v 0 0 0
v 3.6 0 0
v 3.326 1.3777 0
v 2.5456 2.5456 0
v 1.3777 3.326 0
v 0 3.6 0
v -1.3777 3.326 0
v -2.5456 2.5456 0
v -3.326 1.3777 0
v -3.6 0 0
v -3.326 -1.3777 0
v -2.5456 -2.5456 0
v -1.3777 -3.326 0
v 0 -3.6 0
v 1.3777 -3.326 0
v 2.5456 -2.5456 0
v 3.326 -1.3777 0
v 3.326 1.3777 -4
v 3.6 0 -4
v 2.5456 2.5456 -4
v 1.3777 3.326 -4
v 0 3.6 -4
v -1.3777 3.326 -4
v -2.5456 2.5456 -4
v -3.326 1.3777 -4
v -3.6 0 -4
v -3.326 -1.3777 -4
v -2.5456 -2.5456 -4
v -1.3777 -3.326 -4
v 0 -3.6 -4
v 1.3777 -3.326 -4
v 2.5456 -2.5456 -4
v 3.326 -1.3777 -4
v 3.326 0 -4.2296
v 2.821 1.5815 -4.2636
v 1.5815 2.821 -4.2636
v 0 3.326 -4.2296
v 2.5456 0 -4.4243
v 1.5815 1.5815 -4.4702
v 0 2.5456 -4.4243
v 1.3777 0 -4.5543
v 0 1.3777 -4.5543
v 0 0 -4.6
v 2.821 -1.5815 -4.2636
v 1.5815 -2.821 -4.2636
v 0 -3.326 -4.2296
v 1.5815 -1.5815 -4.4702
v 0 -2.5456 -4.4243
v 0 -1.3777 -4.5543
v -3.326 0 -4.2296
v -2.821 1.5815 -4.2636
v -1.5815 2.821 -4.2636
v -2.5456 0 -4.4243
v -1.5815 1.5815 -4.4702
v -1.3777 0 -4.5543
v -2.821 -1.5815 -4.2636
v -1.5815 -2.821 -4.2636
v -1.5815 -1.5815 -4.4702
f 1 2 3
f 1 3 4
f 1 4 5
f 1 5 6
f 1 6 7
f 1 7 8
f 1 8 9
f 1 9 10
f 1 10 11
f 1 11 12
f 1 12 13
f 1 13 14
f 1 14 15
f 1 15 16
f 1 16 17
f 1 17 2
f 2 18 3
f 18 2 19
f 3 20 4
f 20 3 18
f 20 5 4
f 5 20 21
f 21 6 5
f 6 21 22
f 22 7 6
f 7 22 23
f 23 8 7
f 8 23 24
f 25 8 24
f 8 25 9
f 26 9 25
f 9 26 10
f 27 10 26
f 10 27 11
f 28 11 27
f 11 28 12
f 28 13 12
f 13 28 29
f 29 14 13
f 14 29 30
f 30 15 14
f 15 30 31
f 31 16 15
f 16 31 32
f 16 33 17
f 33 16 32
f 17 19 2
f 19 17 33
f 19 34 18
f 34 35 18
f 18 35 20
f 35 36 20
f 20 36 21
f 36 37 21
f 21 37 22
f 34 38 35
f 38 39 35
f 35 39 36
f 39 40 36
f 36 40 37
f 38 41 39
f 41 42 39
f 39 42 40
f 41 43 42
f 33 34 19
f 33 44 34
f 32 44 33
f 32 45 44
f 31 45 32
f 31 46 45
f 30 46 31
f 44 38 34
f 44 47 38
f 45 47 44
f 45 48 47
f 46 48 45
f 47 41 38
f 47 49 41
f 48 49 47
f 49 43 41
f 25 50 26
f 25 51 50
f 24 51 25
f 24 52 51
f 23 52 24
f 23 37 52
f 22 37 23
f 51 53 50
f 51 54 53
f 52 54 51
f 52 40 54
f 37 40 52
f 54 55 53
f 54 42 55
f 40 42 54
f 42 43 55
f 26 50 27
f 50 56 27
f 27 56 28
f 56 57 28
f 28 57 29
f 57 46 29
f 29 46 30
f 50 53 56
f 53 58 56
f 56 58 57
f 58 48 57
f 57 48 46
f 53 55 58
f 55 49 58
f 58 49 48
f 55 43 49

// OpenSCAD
// file: ../p/1-8sphe.scad
use <../lib.scad>
function ldraw_lib__1_8sphe() = [
// 0 Sphere 0.125
// 0 Name: 1-8sphe.dat
// 0 Author: James Jessiman
// 0 !LDRAW_ORG Primitive UPDATE 2012-03
// 0 !LICENSE Licensed under CC BY 4.0 : see CAreadme.txt
// 
// 0 BFC CERTIFY CCW
  [0,"BFC","CERTIFY"],
  [0,"BFC","CCW"],
// 
// 0 !HISTORY 2000-08-01 {Axel Poque} fixes to resolve L3P error messages.
// 0 !HISTORY 2000-08-01 {Manfred Moolhuysen} fixes to resolve L3P error messages.
// 0 !HISTORY 2000-09-30 [PTadmin] Official Update 2000-02
// 0 !HISTORY 2002-03-28 [hafhead] Made BFC compliant
// 0 !HISTORY 2002-04-25 [PTadmin] Official Update 2002-02
// 0 !HISTORY 2007-06-22 [PTadmin] Header formatted for Contributor Agreement
// 0 !HISTORY 2008-07-01 [PTadmin] Official Update 2008-01
// 0 !HISTORY 2010-09-12 [MagFors] Changed winding, removed duplicated cond-line, optimized filesize
// 0 !HISTORY 2010-12-31 [PTadmin] Official Update 2010-03
// 0 !HISTORY 2012-07-01 [tcobbs] Replaced with geometry from LDView
// 0 !HISTORY 2012-12-28 [PTadmin] Official Update 2012-03
// 
// 
// 3 16 1 0 0 0.9239 0.3827 0 0.9239 0 0.3827
  [3,16,1,0,0,0.9239,0.3827,0,0.9239,0,0.3827],
// 3 16 0.9239 0.3827 0 0.7836 0.4393 0.4393 0.9239 0 0.3827
  [3,16,0.9239,0.3827,0,0.7836,0.4393,0.4393,0.9239,0,0.3827],
// 3 16 0.9239 0 0.3827 0.7836 0.4393 0.4393 0.7071 0 0.7071
  [3,16,0.9239,0,0.3827,0.7836,0.4393,0.4393,0.7071,0,0.7071],
// 3 16 0.7836 0.4393 0.4393 0.4393 0.4393 0.7836 0.7071 0 0.7071
  [3,16,0.7836,0.4393,0.4393,0.4393,0.4393,0.7836,0.7071,0,0.7071],
// 3 16 0.7071 0 0.7071 0.4393 0.4393 0.7836 0.3827 0 0.9239
  [3,16,0.7071,0,0.7071,0.4393,0.4393,0.7836,0.3827,0,0.9239],
// 3 16 0.4393 0.4393 0.7836 0 0.3827 0.9239 0.3827 0 0.9239
  [3,16,0.4393,0.4393,0.7836,0,0.3827,0.9239,0.3827,0,0.9239],
// 3 16 0.3827 0 0.9239 0 0.3827 0.9239 0 0 1
  [3,16,0.3827,0,0.9239,0,0.3827,0.9239,0,0,1],
// 3 16 0.9239 0.3827 0 0.7071 0.7071 0 0.7836 0.4393 0.4393
  [3,16,0.9239,0.3827,0,0.7071,0.7071,0,0.7836,0.4393,0.4393],
// 3 16 0.7071 0.7071 0 0.4393 0.7836 0.4393 0.7836 0.4393 0.4393
  [3,16,0.7071,0.7071,0,0.4393,0.7836,0.4393,0.7836,0.4393,0.4393],
// 3 16 0.7836 0.4393 0.4393 0.4393 0.7836 0.4393 0.4393 0.4393 0.7836
  [3,16,0.7836,0.4393,0.4393,0.4393,0.7836,0.4393,0.4393,0.4393,0.7836],
// 3 16 0.4393 0.7836 0.4393 0 0.7071 0.7071 0.4393 0.4393 0.7836
  [3,16,0.4393,0.7836,0.4393,0,0.7071,0.7071,0.4393,0.4393,0.7836],
// 3 16 0.4393 0.4393 0.7836 0 0.7071 0.7071 0 0.3827 0.9239
  [3,16,0.4393,0.4393,0.7836,0,0.7071,0.7071,0,0.3827,0.9239],
// 3 16 0.7071 0.7071 0 0.3827 0.9239 0 0.4393 0.7836 0.4393
  [3,16,0.7071,0.7071,0,0.3827,0.9239,0,0.4393,0.7836,0.4393],
// 3 16 0.3827 0.9239 0 0 0.9239 0.3827 0.4393 0.7836 0.4393
  [3,16,0.3827,0.9239,0,0,0.9239,0.3827,0.4393,0.7836,0.4393],
// 3 16 0.4393 0.7836 0.4393 0 0.9239 0.3827 0 0.7071 0.7071
  [3,16,0.4393,0.7836,0.4393,0,0.9239,0.3827,0,0.7071,0.7071],
// 3 16 0.3827 0.9239 0 0 1 0 0 0.9239 0.3827
  [3,16,0.3827,0.9239,0,0,1,0,0,0.9239,0.3827],
// 
// 5 24 1 0 0 0.9239 0.3827 0 1 0 -0.1 0.9239 0 0.3827
  [5,24,1,0,0,0.9239,0.3827,0,1,0,-0.1,0.9239,0,0.3827],
// 5 24 0.9239 0.3827 0 0.9239 0 0.3827 1 0 0 0.7836 0.4393 0.4393
  [5,24,0.9239,0.3827,0,0.9239,0,0.3827,1,0,0,0.7836,0.4393,0.4393],
// 5 24 1 0 0 0.9239 0 0.3827 0.9239 0.3827 0 1 -0.1 0
  [5,24,1,0,0,0.9239,0,0.3827,0.9239,0.3827,0,1,-0.1,0],
// 5 24 0.9239 0 0.3827 0.7836 0.4393 0.4393 0.9239 0.3827 0 0.7071 0 0.7071
  [5,24,0.9239,0,0.3827,0.7836,0.4393,0.4393,0.9239,0.3827,0,0.7071,0,0.7071],
// 5 24 0.7836 0.4393 0.4393 0.7071 0 0.7071 0.9239 0 0.3827 0.4393 0.4393 0.7836
  [5,24,0.7836,0.4393,0.4393,0.7071,0,0.7071,0.9239,0,0.3827,0.4393,0.4393,0.7836],
// 5 24 0.9239 0 0.3827 0.7071 0 0.7071 0.7836 0.4393 0.4393 0.9239 -0.1 0.3827
  [5,24,0.9239,0,0.3827,0.7071,0,0.7071,0.7836,0.4393,0.4393,0.9239,-0.1,0.3827],
// 5 24 0.7071 0 0.7071 0.4393 0.4393 0.7836 0.7836 0.4393 0.4393 0.3827 0 0.9239
  [5,24,0.7071,0,0.7071,0.4393,0.4393,0.7836,0.7836,0.4393,0.4393,0.3827,0,0.9239],
// 5 24 0.4393 0.4393 0.7836 0.3827 0 0.9239 0.7071 0 0.7071 0 0.3827 0.9239
  [5,24,0.4393,0.4393,0.7836,0.3827,0,0.9239,0.7071,0,0.7071,0,0.3827,0.9239],
// 5 24 0.7071 0 0.7071 0.3827 0 0.9239 0.4393 0.4393 0.7836 0.7071 -0.1 0.7071
  [5,24,0.7071,0,0.7071,0.3827,0,0.9239,0.4393,0.4393,0.7836,0.7071,-0.1,0.7071],
// 5 24 0.3827 0 0.9239 0 0.3827 0.9239 0.4393 0.4393 0.7836 0 0 1
  [5,24,0.3827,0,0.9239,0,0.3827,0.9239,0.4393,0.4393,0.7836,0,0,1],
// 5 24 0 0.3827 0.9239 0 0 1 0.3827 0 0.9239 -0.1 0.3827 0.9239
  [5,24,0,0.3827,0.9239,0,0,1,0.3827,0,0.9239,-0.1,0.3827,0.9239],
// 5 24 0.3827 0 0.9239 0 0 1 0 0.3827 0.9239 0.3827 -0.1 0.9239
  [5,24,0.3827,0,0.9239,0,0,1,0,0.3827,0.9239,0.3827,-0.1,0.9239],
// 5 24 0.9239 0.3827 0 0.7071 0.7071 0 0.9239 0.3827 -0.1 0.7836 0.4393 0.4393
  [5,24,0.9239,0.3827,0,0.7071,0.7071,0,0.9239,0.3827,-0.1,0.7836,0.4393,0.4393],
// 5 24 0.7071 0.7071 0 0.7836 0.4393 0.4393 0.9239 0.3827 0 0.4393 0.7836 0.4393
  [5,24,0.7071,0.7071,0,0.7836,0.4393,0.4393,0.9239,0.3827,0,0.4393,0.7836,0.4393],
// 5 24 0.9239 0.3827 0 0.7836 0.4393 0.4393 0.7071 0.7071 0 0.9239 0 0.3827
  [5,24,0.9239,0.3827,0,0.7836,0.4393,0.4393,0.7071,0.7071,0,0.9239,0,0.3827],
// 5 24 0.7836 0.4393 0.4393 0.4393 0.7836 0.4393 0.7071 0.7071 0 0.4393 0.4393 0.7836
  [5,24,0.7836,0.4393,0.4393,0.4393,0.7836,0.4393,0.7071,0.7071,0,0.4393,0.4393,0.7836],
// 5 24 0.4393 0.7836 0.4393 0.4393 0.4393 0.7836 0.7836 0.4393 0.4393 0 0.7071 0.7071
  [5,24,0.4393,0.7836,0.4393,0.4393,0.4393,0.7836,0.7836,0.4393,0.4393,0,0.7071,0.7071],
// 5 24 0.7836 0.4393 0.4393 0.4393 0.4393 0.7836 0.4393 0.7836 0.4393 0.7071 0 0.7071
  [5,24,0.7836,0.4393,0.4393,0.4393,0.4393,0.7836,0.4393,0.7836,0.4393,0.7071,0,0.7071],
// 5 24 0.4393 0.4393 0.7836 0 0.7071 0.7071 0.4393 0.7836 0.4393 0 0.3827 0.9239
  [5,24,0.4393,0.4393,0.7836,0,0.7071,0.7071,0.4393,0.7836,0.4393,0,0.3827,0.9239],
// 5 24 0 0.7071 0.7071 0 0.3827 0.9239 0.4393 0.4393 0.7836 -0.1 0.7071 0.7071
  [5,24,0,0.7071,0.7071,0,0.3827,0.9239,0.4393,0.4393,0.7836,-0.1,0.7071,0.7071],
// 5 24 0.4393 0.4393 0.7836 0 0.3827 0.9239 0 0.7071 0.7071 0.3827 0 0.9239
  [5,24,0.4393,0.4393,0.7836,0,0.3827,0.9239,0,0.7071,0.7071,0.3827,0,0.9239],
// 5 24 0.7071 0.7071 0 0.3827 0.9239 0 0.7071 0.7071 -0.1 0.4393 0.7836 0.4393
  [5,24,0.7071,0.7071,0,0.3827,0.9239,0,0.7071,0.7071,-0.1,0.4393,0.7836,0.4393],
// 5 24 0.3827 0.9239 0 0.4393 0.7836 0.4393 0.7071 0.7071 0 0 0.9239 0.3827
  [5,24,0.3827,0.9239,0,0.4393,0.7836,0.4393,0.7071,0.7071,0,0,0.9239,0.3827],
// 5 24 0.7071 0.7071 0 0.4393 0.7836 0.4393 0.3827 0.9239 0 0.7836 0.4393 0.4393
  [5,24,0.7071,0.7071,0,0.4393,0.7836,0.4393,0.3827,0.9239,0,0.7836,0.4393,0.4393],
// 5 24 0.4393 0.7836 0.4393 0 0.9239 0.3827 0.3827 0.9239 0 0 0.7071 0.7071
  [5,24,0.4393,0.7836,0.4393,0,0.9239,0.3827,0.3827,0.9239,0,0,0.7071,0.7071],
// 5 24 0 0.9239 0.3827 0 0.7071 0.7071 0.4393 0.7836 0.4393 -0.1 0.9239 0.3827
  [5,24,0,0.9239,0.3827,0,0.7071,0.7071,0.4393,0.7836,0.4393,-0.1,0.9239,0.3827],
// 5 24 0.4393 0.7836 0.4393 0 0.7071 0.7071 0 0.9239 0.3827 0.4393 0.4393 0.7836
  [5,24,0.4393,0.7836,0.4393,0,0.7071,0.7071,0,0.9239,0.3827,0.4393,0.4393,0.7836],
// 5 24 0.3827 0.9239 0 0 1 0 0.3827 0.9239 -0.1 0 0.9239 0.3827
  [5,24,0.3827,0.9239,0,0,1,0,0.3827,0.9239,-0.1,0,0.9239,0.3827],
// 5 24 0 1 0 0 0.9239 0.3827 0.3827 0.9239 0 -0.1 1 0
  [5,24,0,1,0,0,0.9239,0.3827,0.3827,0.9239,0,-0.1,1,0],
// 5 24 0.3827 0.9239 0 0 0.9239 0.3827 0 1 0 0.4393 0.7836 0.4393
  [5,24,0.3827,0.9239,0,0,0.9239,0.3827,0,1,0,0.4393,0.7836,0.4393],
];
module ldraw_lib__1_8sphe(step=0, col=false, unit=2/5, alt=false, line=0.2, solid=!$preview)
    makepoly(ldraw_lib__1_8sphe(), step=step, col=col, unit=unit, alt=alt, line=line, solid=solid);
ldraw_lib__1_8sphe(line=0.2);
// file: ../p/4-8sphe.scad
use <../lib.scad>
use <1-8sphe.scad>
function ldraw_lib__4_8sphe() = [
// 0 Sphere 0.5
// 0 Name: 4-8sphe.dat
// 0 Author: James Jessiman
// 0 !LDRAW_ORG Primitive UPDATE 2003-02
// 0 !LICENSE Licensed under CC BY 4.0 : see CAreadme.txt
// 
// 0 BFC CERTIFY CCW
  [0,"BFC","CERTIFY"],
  [0,"BFC","CCW"],
// 
// 0 !HISTORY 2002-08-31 [izanette] Modified with WINDZ for BFC compliance
// 0 !HISTORY 2003-08-01 [PTadmin] Official Update 2003-02
// 0 !HISTORY 2007-06-24 [PTadmin] Header formatted for Contributor Agreement
// 0 !HISTORY 2008-07-01 [PTadmin] Official Update 2008-01
// 
// 
// 1 16 0 0 0 1 0 0 0 1 0 0 0 1 1-8sphe.dat
  [1,16,0,0,0,1,0,0,0,1,0,0,0,1, ldraw_lib__1_8sphe()],
// 1 16 0 0 0 1 0 0 0 1 0 0 0 -1 1-8sphe.dat
  [1,16,0,0,0,1,0,0,0,1,0,0,0,-1, ldraw_lib__1_8sphe()],
// 1 16 0 0 0 -1 0 0 0 1 0 0 0 1 1-8sphe.dat
  [1,16,0,0,0,-1,0,0,0,1,0,0,0,1, ldraw_lib__1_8sphe()],
// 1 16 0 0 0 -1 0 0 0 1 0 0 0 -1 1-8sphe.dat
  [1,16,0,0,0,-1,0,0,0,1,0,0,0,-1, ldraw_lib__1_8sphe()],
// 0
// 
];
module ldraw_lib__4_8sphe(step=0, col=false, unit=2/5, alt=false, line=0.2, solid=!$preview)
    makepoly(ldraw_lib__4_8sphe(), step=step, col=col, unit=unit, alt=alt, line=line, solid=solid);
ldraw_lib__4_8sphe(line=0.2);
// file: ../p/4-4edge.scad
use <../lib.scad>
function ldraw_lib__4_4edge() = [
// 0 Circle 1.0
// 0 Name: 4-4edge.dat
// 0 Author: James Jessiman
// 0 !LDRAW_ORG Primitive UPDATE 2017-01
// 0 !LICENSE Licensed under CC BY 4.0 : see CAreadme.txt
// 
// 0 BFC CERTIFY CCW
  [0,"BFC","CERTIFY"],
  [0,"BFC","CCW"],
// 
// 0 !HISTORY 1998-12-15 [PTadmin] Official Update 1998-10
// 0 !HISTORY 2005-12-28 [PTadmin] Official Update 2005-01
// 0 !HISTORY 2007-06-24 [PTadmin] Header formatted for Contributor Agreement
// 0 !HISTORY 2008-07-01 [PTadmin] Official Update 2008-01
// 0 !HISTORY 2017-01-15 [Steffen] BFCed
// 0 !HISTORY 2017-12-30 [PTadmin] Official Update 2017-01
// 
// 
// 2 24 1 0 0 0.9239 0 0.3827
  [2,24,1,0,0,0.9239,0,0.3827],
// 2 24 0.9239 0 0.3827 0.7071 0 0.7071
  [2,24,0.9239,0,0.3827,0.7071,0,0.7071],
// 2 24 0.7071 0 0.7071 0.3827 0 0.9239
  [2,24,0.7071,0,0.7071,0.3827,0,0.9239],
// 2 24 0.3827 0 0.9239 0 0 1
  [2,24,0.3827,0,0.9239,0,0,1],
// 2 24 0 0 1 -0.3827 0 0.9239
  [2,24,0,0,1,-0.3827,0,0.9239],
// 2 24 -0.3827 0 0.9239 -0.7071 0 0.7071
  [2,24,-0.3827,0,0.9239,-0.7071,0,0.7071],
// 2 24 -0.7071 0 0.7071 -0.9239 0 0.3827
  [2,24,-0.7071,0,0.7071,-0.9239,0,0.3827],
// 2 24 -0.9239 0 0.3827 -1 0 -0
  [2,24,-0.9239,0,0.3827,-1,0,-0],
// 2 24 -1 0 -0 -0.9239 0 -0.3827
  [2,24,-1,0,-0,-0.9239,0,-0.3827],
// 2 24 -0.9239 0 -0.3827 -0.7071 0 -0.7071
  [2,24,-0.9239,0,-0.3827,-0.7071,0,-0.7071],
// 2 24 -0.7071 0 -0.7071 -0.3827 0 -0.9239
  [2,24,-0.7071,0,-0.7071,-0.3827,0,-0.9239],
// 2 24 -0.3827 0 -0.9239 0 0 -1
  [2,24,-0.3827,0,-0.9239,0,0,-1],
// 2 24 0 0 -1 0.3827 0 -0.9239
  [2,24,0,0,-1,0.3827,0,-0.9239],
// 2 24 0.3827 0 -0.9239 0.7071 0 -0.7071
  [2,24,0.3827,0,-0.9239,0.7071,0,-0.7071],
// 2 24 0.7071 0 -0.7071 0.9239 0 -0.3827
  [2,24,0.7071,0,-0.7071,0.9239,0,-0.3827],
// 2 24 0.9239 0 -0.3827 1 0 0
  [2,24,0.9239,0,-0.3827,1,0,0],
];
module ldraw_lib__4_4edge(step=0, col=false, unit=2/5, alt=false, line=0.2, solid=!$preview)
    makepoly(ldraw_lib__4_4edge(), step=step, col=col, unit=unit, alt=alt, line=line, solid=solid);
ldraw_lib__4_4edge(line=0.2);
// file: ../p/4-4disc.scad
use <../lib.scad>
function ldraw_lib__4_4disc() = [
// 0 Disc 1.0
// 0 Name: 4-4disc.dat
// 0 Author: James Jessiman
// 0 !LDRAW_ORG Primitive UPDATE 2002-02
// 0 !LICENSE Licensed under CC BY 4.0 : see CAreadme.txt
// 
// 0 BFC CERTIFY CCW
  [0,"BFC","CERTIFY"],
  [0,"BFC","CCW"],
// 
// 0 !HISTORY 1998-12-15 [PTadmin] Official Update 1998-10
// 0 !HISTORY 2002-03-23 [sbliss] Added BFC statement
// 0 !HISTORY 2002-04-25 [PTadmin] Official Update 2002-02
// 0 !HISTORY 2007-06-24 [PTadmin] Header formatted for Contributor Agreement
// 0 !HISTORY 2008-07-01 [PTadmin] Official Update 2008-01
// 
// 
// 3 16 0 0 0 1 0 0 0.9239 0 0.3827
  [3,16,0,0,0,1,0,0,0.9239,0,0.3827],
// 3 16 0 0 0 0.9239 0 0.3827 0.7071 0 0.7071
  [3,16,0,0,0,0.9239,0,0.3827,0.7071,0,0.7071],
// 3 16 0 0 0 0.7071 0 0.7071 0.3827 0 0.9239
  [3,16,0,0,0,0.7071,0,0.7071,0.3827,0,0.9239],
// 3 16 0 0 0 0.3827 0 0.9239 0 0 1
  [3,16,0,0,0,0.3827,0,0.9239,0,0,1],
// 3 16 0 0 0 0 0 1 -0.3827 0 0.9239
  [3,16,0,0,0,0,0,1,-0.3827,0,0.9239],
// 3 16 0 0 0 -0.3827 0 0.9239 -0.7071 0 0.7071
  [3,16,0,0,0,-0.3827,0,0.9239,-0.7071,0,0.7071],
// 3 16 0 0 0 -0.7071 0 0.7071 -0.9239 0 0.3827
  [3,16,0,0,0,-0.7071,0,0.7071,-0.9239,0,0.3827],
// 3 16 0 0 0 -0.9239 0 0.3827 -1 0 -0
  [3,16,0,0,0,-0.9239,0,0.3827,-1,0,-0],
// 3 16 0 0 0 -1 0 -0 -0.9239 0 -0.3827
  [3,16,0,0,0,-1,0,-0,-0.9239,0,-0.3827],
// 3 16 0 0 0 -0.9239 0 -0.3827 -0.7071 0 -0.7071
  [3,16,0,0,0,-0.9239,0,-0.3827,-0.7071,0,-0.7071],
// 3 16 0 0 0 -0.7071 0 -0.7071 -0.3827 0 -0.9239
  [3,16,0,0,0,-0.7071,0,-0.7071,-0.3827,0,-0.9239],
// 3 16 0 0 0 -0.3827 0 -0.9239 0 0 -1
  [3,16,0,0,0,-0.3827,0,-0.9239,0,0,-1],
// 3 16 0 0 0 0 0 -1 0.3827 0 -0.9239
  [3,16,0,0,0,0,0,-1,0.3827,0,-0.9239],
// 3 16 0 0 0 0.3827 0 -0.9239 0.7071 0 -0.7071
  [3,16,0,0,0,0.3827,0,-0.9239,0.7071,0,-0.7071],
// 3 16 0 0 0 0.7071 0 -0.7071 0.9239 0 -0.3827
  [3,16,0,0,0,0.7071,0,-0.7071,0.9239,0,-0.3827],
// 3 16 0 0 0 0.9239 0 -0.3827 1 0 0
  [3,16,0,0,0,0.9239,0,-0.3827,1,0,0],
// 0
];
module ldraw_lib__4_4disc(step=0, col=false, unit=2/5, alt=false, line=0.2, solid=!$preview)
    makepoly(ldraw_lib__4_4disc(), step=step, col=col, unit=unit, alt=alt, line=line, solid=solid);
ldraw_lib__4_4disc(line=0.2);
// file: ../p/4-4cyli.scad
use <../lib.scad>
function ldraw_lib__4_4cyli() = [
// 0 Cylinder 1.0
// 0 Name: 4-4cyli.dat
// 0 Author: James Jessiman
// 0 !LDRAW_ORG Primitive UPDATE 2005-01
// 0 !LICENSE Licensed under CC BY 4.0 : see CAreadme.txt
// 
// 0 BFC CERTIFY CCW
  [0,"BFC","CERTIFY"],
  [0,"BFC","CCW"],
// 
// 0 !HISTORY 1998-12-15 [PTadmin] Official Update 1998-10
// 0 !HISTORY 2002-03-23 [sbliss] Added BFC statement; merged headers from files in distributions LDraw 0.27 and Complete.
// 0 !HISTORY 2002-04-25 [PTadmin] Official Update 2002-02
// 0 !HISTORY 2004-12-14 [guyvivan] BFC CCW
// 0 !HISTORY 2005-12-28 [PTadmin] Official Update 2005-01
// 0 !HISTORY 2007-06-24 [PTadmin] Header formatted for Contributor Agreement
// 0 !HISTORY 2008-07-01 [PTadmin] Official Update 2008-01
// 
// 
// 4 16 1 1 0 0.9239 1 0.3827 0.9239 0 0.3827 1 0 0
  [4,16,1,1,0,0.9239,1,0.3827,0.9239,0,0.3827,1,0,0],
// 5 24 1 0 0 1 1 0 0.9239 0 0.3827 0.9239 0 -0.3827
  [5,24,1,0,0,1,1,0,0.9239,0,0.3827,0.9239,0,-0.3827],
// 4 16 0.9239 1 0.3827 0.7071 1 0.7071 0.7071 0 0.7071 0.9239 0 0.3827
  [4,16,0.9239,1,0.3827,0.7071,1,0.7071,0.7071,0,0.7071,0.9239,0,0.3827],
// 5 24 0.9239 0 0.3827 0.9239 1 0.3827 0.7071 0 0.7071 1 0 0
  [5,24,0.9239,0,0.3827,0.9239,1,0.3827,0.7071,0,0.7071,1,0,0],
// 4 16 0.7071 1 0.7071 0.3827 1 0.9239 0.3827 0 0.9239 0.7071 0 0.7071
  [4,16,0.7071,1,0.7071,0.3827,1,0.9239,0.3827,0,0.9239,0.7071,0,0.7071],
// 5 24 0.7071 0 0.7071 0.7071 1 0.7071 0.3827 0 0.9239 0.9239 0 0.3827
  [5,24,0.7071,0,0.7071,0.7071,1,0.7071,0.3827,0,0.9239,0.9239,0,0.3827],
// 4 16 0.3827 1 0.9239 0 1 1 0 0 1 0.3827 0 0.9239
  [4,16,0.3827,1,0.9239,0,1,1,0,0,1,0.3827,0,0.9239],
// 5 24 0.3827 0 0.9239 0.3827 1 0.9239 0 0 1 0.7071 0 0.7071
  [5,24,0.3827,0,0.9239,0.3827,1,0.9239,0,0,1,0.7071,0,0.7071],
// 4 16 0 1 1 -0.3827 1 0.9239 -0.3827 0 0.9239 0 0 1
  [4,16,0,1,1,-0.3827,1,0.9239,-0.3827,0,0.9239,0,0,1],
// 5 24 0 0 1 0 1 1 -0.3827 0 0.9239 0.3827 0 0.9239
  [5,24,0,0,1,0,1,1,-0.3827,0,0.9239,0.3827,0,0.9239],
// 4 16 -0.3827 1 0.9239 -0.7071 1 0.7071 -0.7071 0 0.7071 -0.3827 0 0.9239
  [4,16,-0.3827,1,0.9239,-0.7071,1,0.7071,-0.7071,0,0.7071,-0.3827,0,0.9239],
// 5 24 -0.3827 0 0.9239 -0.3827 1 0.9239 -0.7071 0 0.7071 0 0 1
  [5,24,-0.3827,0,0.9239,-0.3827,1,0.9239,-0.7071,0,0.7071,0,0,1],
// 4 16 -0.7071 1 0.7071 -0.9239 1 0.3827 -0.9239 0 0.3827 -0.7071 0 0.7071
  [4,16,-0.7071,1,0.7071,-0.9239,1,0.3827,-0.9239,0,0.3827,-0.7071,0,0.7071],
// 5 24 -0.7071 0 0.7071 -0.7071 1 0.7071 -0.9239 0 0.3827 -0.3827 0 0.9239
  [5,24,-0.7071,0,0.7071,-0.7071,1,0.7071,-0.9239,0,0.3827,-0.3827,0,0.9239],
// 4 16 -0.9239 1 0.3827 -1 1 0 -1 0 0 -0.9239 0 0.3827
  [4,16,-0.9239,1,0.3827,-1,1,0,-1,0,0,-0.9239,0,0.3827],
// 5 24 -0.9239 0 0.3827 -0.9239 1 0.3827 -1 0 0 -0.7071 0 0.7071
  [5,24,-0.9239,0,0.3827,-0.9239,1,0.3827,-1,0,0,-0.7071,0,0.7071],
// 4 16 -1 1 0 -0.9239 1 -0.3827 -0.9239 0 -0.3827 -1 0 0
  [4,16,-1,1,0,-0.9239,1,-0.3827,-0.9239,0,-0.3827,-1,0,0],
// 5 24 -1 0 0 -1 1 0 -0.9239 0 -0.3827 -0.9239 0 0.3827
  [5,24,-1,0,0,-1,1,0,-0.9239,0,-0.3827,-0.9239,0,0.3827],
// 4 16 -0.9239 1 -0.3827 -0.7071 1 -0.7071 -0.7071 0 -0.7071 -0.9239 0 -0.3827
  [4,16,-0.9239,1,-0.3827,-0.7071,1,-0.7071,-0.7071,0,-0.7071,-0.9239,0,-0.3827],
// 5 24 -0.9239 0 -0.3827 -0.9239 1 -0.3827 -0.7071 0 -0.7071 -1 0 0
  [5,24,-0.9239,0,-0.3827,-0.9239,1,-0.3827,-0.7071,0,-0.7071,-1,0,0],
// 4 16 -0.7071 1 -0.7071 -0.3827 1 -0.9239 -0.3827 0 -0.9239 -0.7071 0 -0.7071
  [4,16,-0.7071,1,-0.7071,-0.3827,1,-0.9239,-0.3827,0,-0.9239,-0.7071,0,-0.7071],
// 5 24 -0.7071 0 -0.7071 -0.7071 1 -0.7071 -0.3827 0 -0.9239 -0.9239 0 -0.3827
  [5,24,-0.7071,0,-0.7071,-0.7071,1,-0.7071,-0.3827,0,-0.9239,-0.9239,0,-0.3827],
// 4 16 -0.3827 1 -0.9239 0 1 -1 0 0 -1 -0.3827 0 -0.9239
  [4,16,-0.3827,1,-0.9239,0,1,-1,0,0,-1,-0.3827,0,-0.9239],
// 5 24 -0.3827 0 -0.9239 -0.3827 1 -0.9239 0 0 -1 -0.7071 0 -0.7071
  [5,24,-0.3827,0,-0.9239,-0.3827,1,-0.9239,0,0,-1,-0.7071,0,-0.7071],
// 4 16 0 1 -1 0.3827 1 -0.9239 0.3827 0 -0.9239 0 0 -1
  [4,16,0,1,-1,0.3827,1,-0.9239,0.3827,0,-0.9239,0,0,-1],
// 5 24 0 0 -1 0 1 -1 0.3827 0 -0.9239 -0.3827 0 -0.9239
  [5,24,0,0,-1,0,1,-1,0.3827,0,-0.9239,-0.3827,0,-0.9239],
// 4 16 0.3827 1 -0.9239 0.7071 1 -0.7071 0.7071 0 -0.7071 0.3827 0 -0.9239
  [4,16,0.3827,1,-0.9239,0.7071,1,-0.7071,0.7071,0,-0.7071,0.3827,0,-0.9239],
// 5 24 0.3827 0 -0.9239 0.3827 1 -0.9239 0.7071 0 -0.7071 0 0 -1
  [5,24,0.3827,0,-0.9239,0.3827,1,-0.9239,0.7071,0,-0.7071,0,0,-1],
// 4 16 0.7071 1 -0.7071 0.9239 1 -0.3827 0.9239 0 -0.3827 0.7071 0 -0.7071
  [4,16,0.7071,1,-0.7071,0.9239,1,-0.3827,0.9239,0,-0.3827,0.7071,0,-0.7071],
// 5 24 0.7071 0 -0.7071 0.7071 1 -0.7071 0.9239 0 -0.3827 0.3827 0 -0.9239
  [5,24,0.7071,0,-0.7071,0.7071,1,-0.7071,0.9239,0,-0.3827,0.3827,0,-0.9239],
// 4 16 0.9239 1 -0.3827 1 1 0 1 0 0 0.9239 0 -0.3827
  [4,16,0.9239,1,-0.3827,1,1,0,1,0,0,0.9239,0,-0.3827],
// 5 24 0.9239 0 -0.3827 0.9239 1 -0.3827 1 0 0 0.7071 0 -0.7071
  [5,24,0.9239,0,-0.3827,0.9239,1,-0.3827,1,0,0,0.7071,0,-0.7071],
// 0
];
module ldraw_lib__4_4cyli(step=0, col=false, unit=2/5, alt=false, line=0.2, solid=!$preview)
    makepoly(ldraw_lib__4_4cyli(), step=step, col=col, unit=unit, alt=alt, line=line, solid=solid);
ldraw_lib__4_4cyli(line=0.2);
// main file
use <../lib.scad>
use <../p/4-4cyli.scad>
use <../p/4-4disc.scad>
use <../p/4-4edge.scad>
use <../p/4-8sphe.scad>
function ldraw_lib__u9130() = [
// 0 ~Electric Train 12V Power Pickup
// 0 Name: u9130.dat
// 0 Author: Steffen [Steffen]
// 0 !LDRAW_ORG Part UPDATE 2025-09
// 0 !LICENSE Licensed under CC BY 4.0 : see CAreadme.txt
// 
// 0 BFC CERTIFY CCW
  [0,"BFC","CERTIFY"],
  [0,"BFC","CCW"],
// 
// 0 !CMDLINE -c494
// 
// 0 !HISTORY 2012-03-30 [PTadmin] Official Update 2012-01
// 0 !HISTORY 2025-09-27 [OrionP] Changed winding to CCW
// 0 !HISTORY 2025-09-29 [OrionP] Official Update 2025-09
// 
// 1 16 0 0 0 9 0 0 0 1.5 0 0 0 9 4-4disc.dat
  [1,16,0,0,0,9,0,0,0,1.5,0,0,0,9, ldraw_lib__4_4disc()],
// 1 16 0 0 0 9 0 0 0 1.5 0 0 0 9 4-4edge.dat
  [1,16,0,0,0,9,0,0,0,1.5,0,0,0,9, ldraw_lib__4_4edge()],
// 1 16 0 0 0 9 0 0 0 10 0 0 0 9 4-4cyli.dat
  [1,16,0,0,0,9,0,0,0,10,0,0,0,9, ldraw_lib__4_4cyli()],
// 1 16 0 10 0 9 0 0 0 1.5 0 0 0 9 4-8sphe.dat
  [1,16,0,10,0,9,0,0,0,1.5,0,0,0,9, ldraw_lib__4_8sphe()],
];
module ldraw_lib__u9130(step=0, col=false, unit=2/5, alt=false, line=0.2, solid=!$preview)
    makepoly(ldraw_lib__u9130(), step=step, col=col, unit=unit, alt=alt, line=line, solid=solid);
ldraw_lib__u9130(line=0.2);
